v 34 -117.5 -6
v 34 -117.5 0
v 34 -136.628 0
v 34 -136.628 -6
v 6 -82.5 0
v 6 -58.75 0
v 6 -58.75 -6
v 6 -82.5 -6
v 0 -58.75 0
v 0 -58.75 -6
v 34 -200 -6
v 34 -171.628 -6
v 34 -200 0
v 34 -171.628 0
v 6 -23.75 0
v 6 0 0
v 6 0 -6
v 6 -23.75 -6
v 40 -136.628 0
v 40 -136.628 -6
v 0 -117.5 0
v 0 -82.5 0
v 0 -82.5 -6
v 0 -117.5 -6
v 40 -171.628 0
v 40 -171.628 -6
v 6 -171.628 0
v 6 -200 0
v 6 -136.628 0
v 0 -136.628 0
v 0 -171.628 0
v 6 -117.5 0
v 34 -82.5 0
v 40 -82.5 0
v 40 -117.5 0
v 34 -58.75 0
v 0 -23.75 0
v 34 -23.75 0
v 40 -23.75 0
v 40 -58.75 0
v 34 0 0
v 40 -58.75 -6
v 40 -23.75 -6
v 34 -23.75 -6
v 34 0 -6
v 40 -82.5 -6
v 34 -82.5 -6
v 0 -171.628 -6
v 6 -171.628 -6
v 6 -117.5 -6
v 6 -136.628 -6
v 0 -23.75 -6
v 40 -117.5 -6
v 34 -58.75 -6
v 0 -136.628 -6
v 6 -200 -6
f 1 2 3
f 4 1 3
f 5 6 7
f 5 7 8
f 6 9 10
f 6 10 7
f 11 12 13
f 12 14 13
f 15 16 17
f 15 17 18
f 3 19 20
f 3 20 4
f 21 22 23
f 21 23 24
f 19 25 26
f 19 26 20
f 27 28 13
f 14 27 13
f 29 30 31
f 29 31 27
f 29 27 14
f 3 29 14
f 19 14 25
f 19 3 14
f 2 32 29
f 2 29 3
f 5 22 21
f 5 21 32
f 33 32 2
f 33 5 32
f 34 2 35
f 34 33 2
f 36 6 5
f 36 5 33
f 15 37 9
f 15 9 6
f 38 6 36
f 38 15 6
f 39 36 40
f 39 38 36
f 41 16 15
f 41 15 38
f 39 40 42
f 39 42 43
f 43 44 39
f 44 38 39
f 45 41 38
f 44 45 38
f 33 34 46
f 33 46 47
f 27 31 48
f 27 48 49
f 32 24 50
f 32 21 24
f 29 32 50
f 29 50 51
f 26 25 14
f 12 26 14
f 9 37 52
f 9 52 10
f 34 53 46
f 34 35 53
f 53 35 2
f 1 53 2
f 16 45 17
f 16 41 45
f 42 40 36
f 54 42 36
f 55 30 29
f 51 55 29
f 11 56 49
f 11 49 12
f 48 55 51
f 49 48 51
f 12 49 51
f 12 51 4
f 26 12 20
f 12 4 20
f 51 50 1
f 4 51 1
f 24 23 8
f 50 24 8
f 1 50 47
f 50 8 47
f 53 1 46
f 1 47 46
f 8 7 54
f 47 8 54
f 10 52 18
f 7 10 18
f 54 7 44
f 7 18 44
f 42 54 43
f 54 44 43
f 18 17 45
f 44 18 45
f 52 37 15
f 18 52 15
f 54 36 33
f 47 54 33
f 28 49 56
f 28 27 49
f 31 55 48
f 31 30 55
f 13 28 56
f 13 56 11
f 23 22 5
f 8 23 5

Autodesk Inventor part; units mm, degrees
ref_plane "YZ Plane" through (0, 0, 0) normal (1, 0, 0) x (0, 1, 0)
ref_plane "XZ Plane" through (0, 0, 0) normal (0, 1, 0) x (-1, 0, 0)
ref_plane "XY Plane" through (0, 0, 0) normal (0, 0, 1) x (1, 0, 0)
sketch "Sketch1" plane through (0, 0, 0) normal (0, 0, 1) x (1, 0, 0)
  line L0 (0, 0) -> (0, -23.75)
  line L1 (0, -23.75) -> (6, -23.75)
  line L2 (6, 0) -> (6, -23.75)
  line L3 (0, 0) -> (6, 0)
  line L4 (0, -23.75) -> (0, -58.75)
  line L5 (0, -58.75) -> (6, -58.75)
  line L6 (6, -23.75) -> (6, -58.75) construction
  line L7 (0, -23.75) -> (6, -23.75)
  line L8 (0, -58.75) -> (0, -82.5)
  line L9 (0, -82.5) -> (6, -82.5)
  line L10 (6, -58.75) -> (6, -82.5)
  line L11 (0, -58.75) -> (6, -58.75)
  line L12 (0, -82.5) -> (0, -117.5)
  line L13 (0, -117.5) -> (6, -117.5)
  line L14 (6, -82.5) -> (6, -117.5) construction
  line L15 (0, -82.5) -> (6, -82.5)
  line L16 (0, -117.5) -> (0, -136.6283)
  line L17 (0, -136.6283) -> (6, -136.6283)
  line L18 (6, -117.5) -> (6, -136.6283)
  line L19 (0, -117.5) -> (6, -117.5)
  line L20 (0, -136.6283) -> (0, -171.6283)
  line L21 (0, -171.6283) -> (6, -171.6283)
  line L22 (6, -136.6283) -> (6, -171.6283) construction
  line L23 (0, -136.6283) -> (6, -136.6283)
  line L24 (0, -171.6283) -> (0, -200)
  line L25 (0, -200) -> (6, -200)
  line L26 (6, -171.6283) -> (6, -200)
  line L27 (0, -171.6283) -> (6, -171.6283)
  line L28 (0, -200) -> (40, -200)
  line L29 (40, -200) -> (40, 0)
  line L30 (40, 0) -> (0, 0)
  line L31 (0, 0) -> (0, -200)
extrude "Extrusion1" add sketch "Sketch1" against normal blind 6 contours L1 L2 L30 L29 L28 L26 L21 L20 L17 L18 L13 L12 L9 L10 L5 L4
sketch "Sketch2" plane through (0, 0, 0) normal (0, 0, 1) x (1, 0, 0)
  line L0 (6, 0) -> (6, -23.75) construction
  line L1 (6, -23.75) -> (0, -23.75) construction
  line L2 (0, -23.75) -> (0, -58.75) construction
  line L3 (0, -58.75) -> (6, -58.75) construction
  line L4 (6, -58.75) -> (6, -82.5) construction
  line L5 (0, -82.5) -> (6, -82.5) construction
  line L6 (0, -82.5) -> (0, -117.5) construction
  line L7 (0, -117.5) -> (6, -117.5) construction
  line L8 (6, -117.5) -> (6, -136.6283) construction
  line L9 (0, -136.6283) -> (6, -136.6283) construction
  line L10 (0, -136.6283) -> (0, -171.6283) construction
  line L11 (0, -171.6283) -> (6, -171.6283) construction
  line L12 (6, -171.6283) -> (6, -200) construction
  line L13 (40, 0) -> (40, -200) construction
  line L14 (40, -156.4035) -> (0, -156.4035) construction
  line L15 (0, -171.6283) -> (0, -136.6283) construction
  line L16 (20, -156.4035) -> (20, -119.6077) construction
  line L17 (34, 0) -> (34, -23.75)
  line L18 (34, -23.75) -> (40, -23.75)
  line L19 (40, -23.75) -> (40, -58.75)
  line L20 (40, -58.75) -> (34, -58.75)
  line L21 (34, -58.75) -> (34, -82.5)
  line L22 (40, -82.5) -> (34, -82.5)
  line L23 (40, -82.5) -> (40, -117.5)
  line L24 (40, -117.5) -> (34, -117.5)
  line L25 (34, -117.5) -> (34, -136.6283)
  line L26 (40, -136.6283) -> (34, -136.6283)
  line L27 (40, -136.6283) -> (40, -171.6283) construction
  line L28 (40, -171.6283) -> (34, -171.6283)
  line L29 (34, -171.6283) -> (34, -200)
  line L30 (0, -156.4035) -> (40, -156.4035) construction
  line L31 (40, -171.6283) -> (40, -136.6283) construction
  line L32 (40, 0) -> (40, -200) construction
  line L33 (40, -200) -> (6, -200) construction
  line L34 (34, -200) -> (40, -200)
  line L35 (6, 0) -> (40, 0) construction
  line L36 (34, 0) -> (40, 0)
  line L37 (40, -117.5) -> (40, -136.6283)
  line L38 (40, -171.6283) -> (40, -200)
  line L39 (40, 0) -> (40, -23.75)
  line L40 (40, -82.5) -> (40, -58.75)
  point P0 (0, 0)
extrude "Extrusion2" cut sketch "Sketch2" against normal through all
properties part number "front"
